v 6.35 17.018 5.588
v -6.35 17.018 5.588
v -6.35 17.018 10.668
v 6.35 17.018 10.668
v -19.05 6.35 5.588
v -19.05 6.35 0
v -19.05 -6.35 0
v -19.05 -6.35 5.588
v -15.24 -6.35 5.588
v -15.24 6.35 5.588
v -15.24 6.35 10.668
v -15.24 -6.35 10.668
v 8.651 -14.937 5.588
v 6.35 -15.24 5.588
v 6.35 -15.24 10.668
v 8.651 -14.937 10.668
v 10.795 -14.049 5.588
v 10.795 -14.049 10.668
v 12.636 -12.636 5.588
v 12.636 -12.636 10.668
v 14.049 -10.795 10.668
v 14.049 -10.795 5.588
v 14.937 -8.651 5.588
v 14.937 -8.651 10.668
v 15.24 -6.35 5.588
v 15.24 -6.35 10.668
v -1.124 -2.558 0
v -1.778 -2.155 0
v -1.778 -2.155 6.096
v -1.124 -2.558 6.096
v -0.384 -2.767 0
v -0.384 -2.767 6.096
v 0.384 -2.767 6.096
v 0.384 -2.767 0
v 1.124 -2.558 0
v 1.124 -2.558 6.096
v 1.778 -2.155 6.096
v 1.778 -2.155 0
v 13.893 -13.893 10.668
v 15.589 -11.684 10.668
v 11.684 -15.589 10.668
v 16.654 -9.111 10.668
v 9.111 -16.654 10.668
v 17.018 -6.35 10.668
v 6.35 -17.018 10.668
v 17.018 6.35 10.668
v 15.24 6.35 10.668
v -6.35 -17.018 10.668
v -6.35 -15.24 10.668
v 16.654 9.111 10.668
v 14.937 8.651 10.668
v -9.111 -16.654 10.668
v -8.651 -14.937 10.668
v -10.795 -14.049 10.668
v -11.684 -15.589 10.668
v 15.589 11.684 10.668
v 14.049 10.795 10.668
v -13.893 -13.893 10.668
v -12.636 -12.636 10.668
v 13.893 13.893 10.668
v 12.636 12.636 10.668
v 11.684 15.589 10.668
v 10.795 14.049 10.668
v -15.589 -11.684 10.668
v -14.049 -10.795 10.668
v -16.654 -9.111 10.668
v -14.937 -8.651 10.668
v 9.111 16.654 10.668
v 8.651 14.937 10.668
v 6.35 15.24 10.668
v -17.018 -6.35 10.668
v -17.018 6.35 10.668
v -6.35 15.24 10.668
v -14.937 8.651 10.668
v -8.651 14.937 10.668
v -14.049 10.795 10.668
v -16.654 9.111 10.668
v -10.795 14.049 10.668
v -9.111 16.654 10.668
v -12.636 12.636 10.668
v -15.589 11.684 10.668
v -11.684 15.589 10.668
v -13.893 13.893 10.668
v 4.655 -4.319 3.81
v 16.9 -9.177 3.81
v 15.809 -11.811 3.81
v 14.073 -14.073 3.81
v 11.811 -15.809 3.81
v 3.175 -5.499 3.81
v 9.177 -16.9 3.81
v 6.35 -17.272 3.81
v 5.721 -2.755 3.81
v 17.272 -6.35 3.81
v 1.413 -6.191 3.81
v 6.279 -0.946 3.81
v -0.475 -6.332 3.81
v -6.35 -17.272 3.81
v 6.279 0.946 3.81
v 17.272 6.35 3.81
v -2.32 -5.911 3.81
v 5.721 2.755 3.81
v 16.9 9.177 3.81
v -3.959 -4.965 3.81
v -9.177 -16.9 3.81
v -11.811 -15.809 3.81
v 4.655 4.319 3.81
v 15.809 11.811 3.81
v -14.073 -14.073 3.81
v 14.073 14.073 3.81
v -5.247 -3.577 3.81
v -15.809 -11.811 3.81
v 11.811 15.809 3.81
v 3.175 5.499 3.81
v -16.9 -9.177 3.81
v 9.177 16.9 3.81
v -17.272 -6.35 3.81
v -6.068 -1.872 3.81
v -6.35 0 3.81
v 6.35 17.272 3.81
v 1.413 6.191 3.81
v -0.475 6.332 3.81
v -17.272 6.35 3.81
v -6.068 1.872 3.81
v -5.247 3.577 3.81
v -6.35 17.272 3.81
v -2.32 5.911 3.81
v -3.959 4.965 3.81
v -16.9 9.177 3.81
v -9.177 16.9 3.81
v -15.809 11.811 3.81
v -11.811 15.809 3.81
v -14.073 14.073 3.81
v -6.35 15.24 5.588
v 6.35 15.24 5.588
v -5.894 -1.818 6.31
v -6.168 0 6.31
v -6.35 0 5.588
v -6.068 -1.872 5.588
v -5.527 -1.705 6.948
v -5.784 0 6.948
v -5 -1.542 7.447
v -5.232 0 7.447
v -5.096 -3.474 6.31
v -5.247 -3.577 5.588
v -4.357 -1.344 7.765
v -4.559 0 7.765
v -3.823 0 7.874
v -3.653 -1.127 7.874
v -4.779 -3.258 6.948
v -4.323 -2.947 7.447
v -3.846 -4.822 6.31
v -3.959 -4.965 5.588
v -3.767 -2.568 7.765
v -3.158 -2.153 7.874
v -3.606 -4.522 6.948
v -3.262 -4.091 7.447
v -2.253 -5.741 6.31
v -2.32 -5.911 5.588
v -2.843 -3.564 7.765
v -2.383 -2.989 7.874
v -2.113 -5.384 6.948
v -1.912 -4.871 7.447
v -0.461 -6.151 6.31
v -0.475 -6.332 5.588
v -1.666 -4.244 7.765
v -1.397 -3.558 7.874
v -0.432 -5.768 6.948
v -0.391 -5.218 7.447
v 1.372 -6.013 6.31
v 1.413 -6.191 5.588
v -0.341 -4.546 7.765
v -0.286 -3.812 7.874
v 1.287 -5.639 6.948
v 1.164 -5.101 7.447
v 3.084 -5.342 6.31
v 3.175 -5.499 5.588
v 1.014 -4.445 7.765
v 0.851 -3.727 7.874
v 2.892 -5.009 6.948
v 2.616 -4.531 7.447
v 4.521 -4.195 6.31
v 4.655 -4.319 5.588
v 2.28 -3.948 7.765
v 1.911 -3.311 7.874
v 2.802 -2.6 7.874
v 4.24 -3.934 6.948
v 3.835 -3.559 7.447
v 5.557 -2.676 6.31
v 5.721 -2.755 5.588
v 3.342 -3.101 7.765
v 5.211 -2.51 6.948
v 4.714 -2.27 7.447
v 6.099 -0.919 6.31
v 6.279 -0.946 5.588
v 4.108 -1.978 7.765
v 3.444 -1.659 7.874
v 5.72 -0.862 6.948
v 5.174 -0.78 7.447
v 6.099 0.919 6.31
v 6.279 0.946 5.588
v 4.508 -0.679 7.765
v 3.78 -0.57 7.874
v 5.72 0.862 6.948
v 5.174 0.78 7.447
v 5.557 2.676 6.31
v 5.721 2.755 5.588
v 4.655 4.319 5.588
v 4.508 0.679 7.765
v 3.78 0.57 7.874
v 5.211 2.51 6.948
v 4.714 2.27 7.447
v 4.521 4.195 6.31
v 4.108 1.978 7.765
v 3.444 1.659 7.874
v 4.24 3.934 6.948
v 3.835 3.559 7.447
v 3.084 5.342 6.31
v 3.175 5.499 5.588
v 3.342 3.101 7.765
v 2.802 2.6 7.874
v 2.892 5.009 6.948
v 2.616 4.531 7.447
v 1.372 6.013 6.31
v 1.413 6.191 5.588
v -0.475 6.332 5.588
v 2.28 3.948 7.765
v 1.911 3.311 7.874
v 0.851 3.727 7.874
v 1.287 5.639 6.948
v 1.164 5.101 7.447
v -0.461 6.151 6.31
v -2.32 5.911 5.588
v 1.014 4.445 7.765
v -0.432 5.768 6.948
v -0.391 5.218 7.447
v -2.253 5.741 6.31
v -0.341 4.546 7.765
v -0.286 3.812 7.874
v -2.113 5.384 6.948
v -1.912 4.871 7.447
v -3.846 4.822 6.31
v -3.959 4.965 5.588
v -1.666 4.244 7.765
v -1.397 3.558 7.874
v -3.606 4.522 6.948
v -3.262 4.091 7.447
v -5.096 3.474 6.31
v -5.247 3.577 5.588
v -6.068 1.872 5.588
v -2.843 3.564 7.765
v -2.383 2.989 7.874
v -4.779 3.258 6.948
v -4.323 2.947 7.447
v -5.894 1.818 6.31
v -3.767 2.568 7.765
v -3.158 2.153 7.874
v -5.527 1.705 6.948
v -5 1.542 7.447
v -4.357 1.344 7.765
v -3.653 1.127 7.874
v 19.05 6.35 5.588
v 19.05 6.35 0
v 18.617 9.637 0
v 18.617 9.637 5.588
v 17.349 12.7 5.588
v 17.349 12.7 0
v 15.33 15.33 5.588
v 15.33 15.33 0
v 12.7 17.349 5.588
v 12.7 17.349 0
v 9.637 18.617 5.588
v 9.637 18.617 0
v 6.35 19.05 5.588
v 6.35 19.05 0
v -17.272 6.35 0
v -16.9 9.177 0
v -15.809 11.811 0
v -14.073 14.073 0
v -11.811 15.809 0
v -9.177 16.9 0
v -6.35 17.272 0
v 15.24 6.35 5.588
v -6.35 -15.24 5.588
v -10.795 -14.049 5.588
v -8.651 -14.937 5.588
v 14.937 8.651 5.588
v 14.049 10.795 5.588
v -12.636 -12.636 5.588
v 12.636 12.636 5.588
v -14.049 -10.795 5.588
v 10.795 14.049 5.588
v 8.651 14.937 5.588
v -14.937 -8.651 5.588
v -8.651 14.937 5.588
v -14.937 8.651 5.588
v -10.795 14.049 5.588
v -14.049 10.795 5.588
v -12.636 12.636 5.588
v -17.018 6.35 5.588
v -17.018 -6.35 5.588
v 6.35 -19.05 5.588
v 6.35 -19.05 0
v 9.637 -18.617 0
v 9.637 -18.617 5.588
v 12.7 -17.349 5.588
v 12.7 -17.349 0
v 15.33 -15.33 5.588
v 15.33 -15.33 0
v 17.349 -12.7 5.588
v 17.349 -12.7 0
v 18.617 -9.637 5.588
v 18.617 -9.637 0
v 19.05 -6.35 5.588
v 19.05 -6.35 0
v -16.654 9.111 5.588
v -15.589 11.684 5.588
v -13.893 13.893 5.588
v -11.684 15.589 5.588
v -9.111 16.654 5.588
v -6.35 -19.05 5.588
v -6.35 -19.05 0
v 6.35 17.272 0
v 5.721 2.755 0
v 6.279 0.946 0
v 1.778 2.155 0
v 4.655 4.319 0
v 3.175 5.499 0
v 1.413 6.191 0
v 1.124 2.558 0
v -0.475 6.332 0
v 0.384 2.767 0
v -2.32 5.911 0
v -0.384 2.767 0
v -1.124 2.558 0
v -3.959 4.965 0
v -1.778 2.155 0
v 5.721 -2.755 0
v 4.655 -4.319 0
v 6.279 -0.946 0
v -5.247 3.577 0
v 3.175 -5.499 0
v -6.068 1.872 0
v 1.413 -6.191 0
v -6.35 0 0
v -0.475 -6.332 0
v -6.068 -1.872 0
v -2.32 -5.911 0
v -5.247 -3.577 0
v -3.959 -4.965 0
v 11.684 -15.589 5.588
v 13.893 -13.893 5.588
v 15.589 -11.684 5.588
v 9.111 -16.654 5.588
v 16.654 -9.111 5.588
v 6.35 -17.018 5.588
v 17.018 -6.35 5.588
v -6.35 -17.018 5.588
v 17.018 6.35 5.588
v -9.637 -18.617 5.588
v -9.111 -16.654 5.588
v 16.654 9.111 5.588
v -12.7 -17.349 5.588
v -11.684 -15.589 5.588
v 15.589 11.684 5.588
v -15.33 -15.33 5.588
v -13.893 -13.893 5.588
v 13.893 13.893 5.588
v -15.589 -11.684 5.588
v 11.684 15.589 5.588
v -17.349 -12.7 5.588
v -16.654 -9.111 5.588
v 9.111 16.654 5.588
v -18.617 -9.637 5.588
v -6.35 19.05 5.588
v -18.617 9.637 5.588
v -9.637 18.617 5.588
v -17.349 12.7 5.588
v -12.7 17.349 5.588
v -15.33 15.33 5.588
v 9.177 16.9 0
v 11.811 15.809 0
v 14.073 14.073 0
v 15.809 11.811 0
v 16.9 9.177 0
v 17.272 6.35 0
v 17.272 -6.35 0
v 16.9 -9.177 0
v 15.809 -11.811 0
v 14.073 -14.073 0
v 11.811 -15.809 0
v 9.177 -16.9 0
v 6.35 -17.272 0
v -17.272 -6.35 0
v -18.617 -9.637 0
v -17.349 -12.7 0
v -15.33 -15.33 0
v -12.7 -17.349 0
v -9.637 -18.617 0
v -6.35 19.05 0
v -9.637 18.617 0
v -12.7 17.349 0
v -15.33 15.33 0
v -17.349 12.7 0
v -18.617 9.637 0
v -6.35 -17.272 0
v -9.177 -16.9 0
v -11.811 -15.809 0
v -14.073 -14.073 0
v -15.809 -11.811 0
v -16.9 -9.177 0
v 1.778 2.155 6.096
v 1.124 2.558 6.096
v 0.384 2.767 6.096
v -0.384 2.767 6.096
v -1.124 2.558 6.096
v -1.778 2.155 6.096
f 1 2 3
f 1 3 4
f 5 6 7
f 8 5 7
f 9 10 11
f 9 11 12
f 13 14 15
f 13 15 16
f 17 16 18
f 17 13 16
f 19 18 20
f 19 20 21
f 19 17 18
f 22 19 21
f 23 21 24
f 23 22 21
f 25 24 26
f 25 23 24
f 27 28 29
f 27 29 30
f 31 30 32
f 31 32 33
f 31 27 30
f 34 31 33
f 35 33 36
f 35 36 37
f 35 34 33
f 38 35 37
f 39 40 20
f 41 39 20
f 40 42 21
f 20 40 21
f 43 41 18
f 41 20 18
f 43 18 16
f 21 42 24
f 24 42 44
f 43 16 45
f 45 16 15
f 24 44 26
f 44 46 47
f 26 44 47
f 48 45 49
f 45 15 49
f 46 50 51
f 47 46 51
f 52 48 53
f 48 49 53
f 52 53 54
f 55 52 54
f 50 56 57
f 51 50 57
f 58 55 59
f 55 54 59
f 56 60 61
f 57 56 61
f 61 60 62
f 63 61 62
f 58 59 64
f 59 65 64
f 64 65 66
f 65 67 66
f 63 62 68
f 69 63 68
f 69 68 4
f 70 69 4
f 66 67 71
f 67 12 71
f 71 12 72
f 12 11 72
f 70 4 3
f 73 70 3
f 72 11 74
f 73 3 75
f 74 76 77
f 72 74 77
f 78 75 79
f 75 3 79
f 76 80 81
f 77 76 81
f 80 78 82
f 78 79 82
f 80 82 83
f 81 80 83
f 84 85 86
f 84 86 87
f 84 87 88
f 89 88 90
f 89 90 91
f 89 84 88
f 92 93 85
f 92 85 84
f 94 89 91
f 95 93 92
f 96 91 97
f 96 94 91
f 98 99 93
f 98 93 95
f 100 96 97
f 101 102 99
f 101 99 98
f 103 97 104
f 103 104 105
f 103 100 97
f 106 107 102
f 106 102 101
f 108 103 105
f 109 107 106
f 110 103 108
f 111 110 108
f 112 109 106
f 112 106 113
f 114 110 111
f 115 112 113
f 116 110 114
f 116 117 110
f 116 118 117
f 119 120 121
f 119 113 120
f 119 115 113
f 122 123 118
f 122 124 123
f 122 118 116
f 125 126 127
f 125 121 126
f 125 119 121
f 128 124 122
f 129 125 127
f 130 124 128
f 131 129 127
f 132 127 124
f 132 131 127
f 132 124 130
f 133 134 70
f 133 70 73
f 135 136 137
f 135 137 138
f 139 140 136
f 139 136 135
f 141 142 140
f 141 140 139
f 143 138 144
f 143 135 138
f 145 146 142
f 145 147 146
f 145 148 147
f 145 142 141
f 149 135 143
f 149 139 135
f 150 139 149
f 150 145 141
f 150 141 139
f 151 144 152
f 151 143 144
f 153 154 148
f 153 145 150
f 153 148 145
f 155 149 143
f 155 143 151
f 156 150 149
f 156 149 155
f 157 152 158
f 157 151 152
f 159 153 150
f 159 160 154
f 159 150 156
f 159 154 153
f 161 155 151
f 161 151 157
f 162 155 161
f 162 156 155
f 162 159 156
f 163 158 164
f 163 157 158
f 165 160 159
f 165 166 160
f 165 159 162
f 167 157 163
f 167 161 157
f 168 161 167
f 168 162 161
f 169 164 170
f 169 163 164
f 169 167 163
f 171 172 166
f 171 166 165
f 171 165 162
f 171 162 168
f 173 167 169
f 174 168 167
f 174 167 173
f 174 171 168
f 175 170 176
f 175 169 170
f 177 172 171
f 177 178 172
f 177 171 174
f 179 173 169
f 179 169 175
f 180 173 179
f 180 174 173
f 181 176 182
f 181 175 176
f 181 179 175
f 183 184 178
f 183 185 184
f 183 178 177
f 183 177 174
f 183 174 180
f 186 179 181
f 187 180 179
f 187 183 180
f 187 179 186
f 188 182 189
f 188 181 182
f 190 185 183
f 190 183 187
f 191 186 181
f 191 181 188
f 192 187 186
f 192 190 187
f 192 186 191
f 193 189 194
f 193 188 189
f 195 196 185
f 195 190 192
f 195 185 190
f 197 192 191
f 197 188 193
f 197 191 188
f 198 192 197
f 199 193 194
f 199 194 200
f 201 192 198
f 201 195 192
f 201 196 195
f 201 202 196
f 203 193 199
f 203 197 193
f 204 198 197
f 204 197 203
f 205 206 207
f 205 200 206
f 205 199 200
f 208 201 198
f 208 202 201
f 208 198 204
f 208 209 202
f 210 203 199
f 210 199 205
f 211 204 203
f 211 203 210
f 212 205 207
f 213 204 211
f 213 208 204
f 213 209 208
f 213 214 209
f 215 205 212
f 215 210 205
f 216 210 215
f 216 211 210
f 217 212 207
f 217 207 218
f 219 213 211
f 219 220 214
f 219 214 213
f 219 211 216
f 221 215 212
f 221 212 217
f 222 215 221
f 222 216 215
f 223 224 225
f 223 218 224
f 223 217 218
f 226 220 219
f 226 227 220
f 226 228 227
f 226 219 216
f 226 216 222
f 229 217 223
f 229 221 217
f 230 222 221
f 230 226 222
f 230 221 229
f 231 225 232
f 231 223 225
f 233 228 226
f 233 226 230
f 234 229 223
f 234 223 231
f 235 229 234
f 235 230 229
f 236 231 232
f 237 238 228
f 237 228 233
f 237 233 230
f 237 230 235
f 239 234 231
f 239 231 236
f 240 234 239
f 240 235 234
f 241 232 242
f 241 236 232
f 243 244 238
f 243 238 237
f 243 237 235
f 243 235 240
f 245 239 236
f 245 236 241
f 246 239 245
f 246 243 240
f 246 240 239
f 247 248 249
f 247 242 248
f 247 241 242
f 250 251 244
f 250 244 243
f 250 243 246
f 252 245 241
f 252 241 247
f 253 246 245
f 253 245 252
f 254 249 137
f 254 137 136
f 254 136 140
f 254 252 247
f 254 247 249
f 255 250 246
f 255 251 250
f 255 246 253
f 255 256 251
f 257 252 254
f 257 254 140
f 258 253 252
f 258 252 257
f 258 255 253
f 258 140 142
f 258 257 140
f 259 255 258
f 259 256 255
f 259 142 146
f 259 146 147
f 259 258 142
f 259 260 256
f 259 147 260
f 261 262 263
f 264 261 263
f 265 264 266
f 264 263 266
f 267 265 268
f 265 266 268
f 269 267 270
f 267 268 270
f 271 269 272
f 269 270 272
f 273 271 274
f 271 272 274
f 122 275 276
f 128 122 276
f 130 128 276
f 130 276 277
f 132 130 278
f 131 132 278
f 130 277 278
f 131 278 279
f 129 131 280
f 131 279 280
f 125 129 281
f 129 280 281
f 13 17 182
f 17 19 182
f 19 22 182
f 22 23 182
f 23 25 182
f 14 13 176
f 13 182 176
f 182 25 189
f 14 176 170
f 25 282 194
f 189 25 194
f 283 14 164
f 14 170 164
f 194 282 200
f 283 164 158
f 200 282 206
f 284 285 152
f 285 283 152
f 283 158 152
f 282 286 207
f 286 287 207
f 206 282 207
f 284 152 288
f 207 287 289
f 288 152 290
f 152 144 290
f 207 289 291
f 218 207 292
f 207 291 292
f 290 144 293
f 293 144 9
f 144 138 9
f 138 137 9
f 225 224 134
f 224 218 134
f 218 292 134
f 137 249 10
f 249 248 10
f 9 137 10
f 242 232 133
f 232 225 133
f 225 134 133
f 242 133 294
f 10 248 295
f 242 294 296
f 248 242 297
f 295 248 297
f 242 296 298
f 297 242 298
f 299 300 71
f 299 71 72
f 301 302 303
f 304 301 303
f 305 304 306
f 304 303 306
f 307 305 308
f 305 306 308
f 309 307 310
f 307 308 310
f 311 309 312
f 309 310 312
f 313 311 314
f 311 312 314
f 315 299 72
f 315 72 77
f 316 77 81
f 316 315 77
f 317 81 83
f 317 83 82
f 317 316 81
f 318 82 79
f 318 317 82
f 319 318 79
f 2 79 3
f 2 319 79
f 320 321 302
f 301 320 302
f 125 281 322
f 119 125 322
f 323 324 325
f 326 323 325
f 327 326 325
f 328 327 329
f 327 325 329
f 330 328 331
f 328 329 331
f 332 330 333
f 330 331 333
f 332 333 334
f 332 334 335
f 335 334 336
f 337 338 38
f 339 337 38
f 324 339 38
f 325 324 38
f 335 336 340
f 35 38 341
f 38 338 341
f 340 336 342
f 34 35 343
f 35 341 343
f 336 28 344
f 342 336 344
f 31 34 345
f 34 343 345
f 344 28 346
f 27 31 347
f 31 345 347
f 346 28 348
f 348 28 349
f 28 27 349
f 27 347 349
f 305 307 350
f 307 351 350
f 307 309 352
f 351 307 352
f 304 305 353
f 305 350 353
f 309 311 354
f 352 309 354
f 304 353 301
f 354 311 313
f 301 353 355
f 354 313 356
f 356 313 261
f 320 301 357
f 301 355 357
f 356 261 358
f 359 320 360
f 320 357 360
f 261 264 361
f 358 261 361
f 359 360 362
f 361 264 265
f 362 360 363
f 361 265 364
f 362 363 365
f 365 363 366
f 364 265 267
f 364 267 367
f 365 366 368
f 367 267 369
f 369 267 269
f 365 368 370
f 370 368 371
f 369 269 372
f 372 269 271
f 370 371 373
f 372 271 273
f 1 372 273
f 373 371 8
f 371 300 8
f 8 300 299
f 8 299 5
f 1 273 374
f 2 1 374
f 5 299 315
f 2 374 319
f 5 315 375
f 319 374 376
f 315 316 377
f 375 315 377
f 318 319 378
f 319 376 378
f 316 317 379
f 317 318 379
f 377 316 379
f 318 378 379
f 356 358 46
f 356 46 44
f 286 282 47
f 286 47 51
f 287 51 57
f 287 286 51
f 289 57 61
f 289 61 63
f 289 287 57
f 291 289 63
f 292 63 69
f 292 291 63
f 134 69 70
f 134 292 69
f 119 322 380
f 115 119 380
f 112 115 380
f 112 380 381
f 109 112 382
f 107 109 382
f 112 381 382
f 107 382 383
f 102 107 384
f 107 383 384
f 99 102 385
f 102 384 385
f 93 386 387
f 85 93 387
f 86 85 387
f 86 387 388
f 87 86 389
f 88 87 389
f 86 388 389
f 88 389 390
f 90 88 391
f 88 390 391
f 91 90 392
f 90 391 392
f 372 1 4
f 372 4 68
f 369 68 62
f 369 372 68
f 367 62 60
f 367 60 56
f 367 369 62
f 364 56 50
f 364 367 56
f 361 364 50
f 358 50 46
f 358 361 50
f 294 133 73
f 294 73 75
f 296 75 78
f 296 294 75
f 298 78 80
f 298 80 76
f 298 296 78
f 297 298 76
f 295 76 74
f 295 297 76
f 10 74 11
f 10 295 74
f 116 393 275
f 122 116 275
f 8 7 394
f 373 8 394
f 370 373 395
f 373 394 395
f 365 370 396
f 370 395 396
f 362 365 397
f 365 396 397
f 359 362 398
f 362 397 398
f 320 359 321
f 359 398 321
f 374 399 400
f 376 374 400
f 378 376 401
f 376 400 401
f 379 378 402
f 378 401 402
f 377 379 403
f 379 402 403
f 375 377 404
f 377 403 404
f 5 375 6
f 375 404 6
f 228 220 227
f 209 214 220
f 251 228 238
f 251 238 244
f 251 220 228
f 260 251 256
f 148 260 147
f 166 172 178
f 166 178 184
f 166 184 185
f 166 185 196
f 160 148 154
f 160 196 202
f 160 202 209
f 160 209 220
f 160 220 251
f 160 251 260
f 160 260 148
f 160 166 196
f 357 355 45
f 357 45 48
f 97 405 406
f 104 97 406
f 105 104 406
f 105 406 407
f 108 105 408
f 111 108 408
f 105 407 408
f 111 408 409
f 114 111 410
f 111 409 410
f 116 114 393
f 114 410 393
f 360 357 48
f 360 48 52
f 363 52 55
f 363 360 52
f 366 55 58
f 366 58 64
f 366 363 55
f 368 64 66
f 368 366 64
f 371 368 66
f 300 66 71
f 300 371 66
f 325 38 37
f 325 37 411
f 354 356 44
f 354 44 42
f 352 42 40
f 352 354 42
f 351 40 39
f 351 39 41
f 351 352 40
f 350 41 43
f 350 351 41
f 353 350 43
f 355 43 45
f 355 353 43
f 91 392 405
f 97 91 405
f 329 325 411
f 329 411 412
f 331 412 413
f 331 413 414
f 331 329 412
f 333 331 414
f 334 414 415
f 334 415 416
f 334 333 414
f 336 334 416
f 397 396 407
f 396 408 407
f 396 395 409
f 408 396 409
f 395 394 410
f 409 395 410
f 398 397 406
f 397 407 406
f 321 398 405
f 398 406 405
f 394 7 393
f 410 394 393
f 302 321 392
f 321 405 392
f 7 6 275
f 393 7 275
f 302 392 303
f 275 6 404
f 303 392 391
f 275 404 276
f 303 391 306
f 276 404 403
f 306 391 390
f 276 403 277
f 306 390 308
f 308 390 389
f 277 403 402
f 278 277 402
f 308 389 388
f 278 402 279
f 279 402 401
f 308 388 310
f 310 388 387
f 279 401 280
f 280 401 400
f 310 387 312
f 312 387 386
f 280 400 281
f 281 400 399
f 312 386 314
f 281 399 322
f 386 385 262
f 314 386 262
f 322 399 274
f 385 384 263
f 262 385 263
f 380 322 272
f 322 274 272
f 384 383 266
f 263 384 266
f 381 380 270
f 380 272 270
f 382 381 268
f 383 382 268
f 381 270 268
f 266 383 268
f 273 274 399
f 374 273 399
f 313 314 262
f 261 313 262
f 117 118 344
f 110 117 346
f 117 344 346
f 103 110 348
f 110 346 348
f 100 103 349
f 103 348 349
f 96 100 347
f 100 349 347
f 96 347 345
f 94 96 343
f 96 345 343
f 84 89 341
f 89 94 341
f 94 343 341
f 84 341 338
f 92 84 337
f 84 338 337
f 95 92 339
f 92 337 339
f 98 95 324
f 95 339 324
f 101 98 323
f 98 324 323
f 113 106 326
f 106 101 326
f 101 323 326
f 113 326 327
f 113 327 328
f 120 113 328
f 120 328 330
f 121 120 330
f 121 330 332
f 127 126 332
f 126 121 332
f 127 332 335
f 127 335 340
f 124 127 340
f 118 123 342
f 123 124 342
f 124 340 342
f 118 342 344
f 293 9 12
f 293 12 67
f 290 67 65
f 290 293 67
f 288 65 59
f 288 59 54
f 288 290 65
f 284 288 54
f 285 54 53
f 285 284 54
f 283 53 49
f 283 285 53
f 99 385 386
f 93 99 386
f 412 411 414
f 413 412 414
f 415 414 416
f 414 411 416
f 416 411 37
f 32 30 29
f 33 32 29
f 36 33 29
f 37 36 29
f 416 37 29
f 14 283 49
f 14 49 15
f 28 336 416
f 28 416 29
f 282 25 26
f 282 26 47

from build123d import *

# Parameters (mm, degrees)
SKETCH1_R           = 6.35
BOSS_EXTRUDE1_DEPTH = 6.096
BOSS_EXTRUDE2_DEPTH = 1.778
CUT_EXTRUDE1_START  = -1.778
CUT_EXTRUDE1_DEPTH  = 1.778
SKETCH5_R           = 6.35
BOSS_EXTRUDE3_DEPTH = 1.778
FILLET2_R           = 2.54
BOSS_EXTRUDE5_START = 3.81
BOSS_EXTRUDE5_DEPTH = 3.81
BOSS_EXTRUDE6_DEPTH = 5.08


with BuildPart() as part:
    # Sketch1 → Boss-Extrude1 (new body)
    with BuildSketch(Plane.XY):
        with Locations(Location((0, 0, 0), (0, 0, 180))):
            Circle(SKETCH1_R)
        with BuildLine():
            Line((-1.778, 2.155261469), (-1.778, -2.155261469))
            ThreePointArc((-1.778, -2.155261469), (0, -2.794), (1.778, -2.155261469))
            Line((1.778, -2.155261469), (1.778, 2.155261469))
            ThreePointArc((1.778, 2.155261469), (0, 2.794), (-1.778, 2.155261469))
        make_face(mode=Mode.SUBTRACT)
    extrude(amount=BOSS_EXTRUDE1_DEPTH)

    # Sketch3 → Boss-Extrude2 (add)
    with BuildSketch(Plane.XY.offset(3.81)):
        with BuildLine():
            Line((-6.35, 19.05), (6.35, 19.05))
            ThreePointArc((6.35, 19.05), (15.330256121, 15.330256121), (19.05, 6.35))
            Line((19.05, 6.35), (19.05, -6.35))
            ThreePointArc((19.05, -6.35), (15.330256121, -15.330256121), (6.35, -19.05))
            Line((6.35, -19.05), (-6.35, -19.05))
            ThreePointArc((-6.35, -19.05), (-15.330256121, -15.330256121), (-19.05, -6.35))
            Line((-19.05, -6.35), (-19.05, 6.35))
            ThreePointArc((-19.05, 6.35), (-15.330256121, 15.330256121), (-6.35, 19.05))
        make_face()
    extrude(amount=BOSS_EXTRUDE2_DEPTH)

    # Sketch4 → Cut-Extrude1 (cut)
    with BuildSketch(Plane.XY.offset(5.588).offset(CUT_EXTRUDE1_START)):
        with BuildLine():
            Line((-1.778, 2.155261469), (-1.778, -2.155261469))
            ThreePointArc((-1.778, -2.155261469), (0, -2.794), (1.778, -2.155261469))
            Line((1.778, -2.155261469), (1.778, 2.155261469))
            ThreePointArc((1.778, 2.155261469), (0, 2.794), (-1.778, 2.155261469))
        make_face()
    extrude(amount=CUT_EXTRUDE1_DEPTH, mode=Mode.SUBTRACT)

    # Sketch5 → Boss-Extrude3 (add)
    with BuildSketch(Plane.XY.offset(6.096)):
        with Locations(Location((0, 0, 0), (0, 0, 180))):
            Circle(SKETCH5_R)
    extrude(amount=BOSS_EXTRUDE3_DEPTH)

    # Fillet2
    # the kernel refuses this fillet: 2.54 mm, written as the material it takes off along each edge
    with BuildSketch(Plane(origin=(0, 0, 7.874), x_dir=(-1, 0, 0), z_dir=(0, 1, 0))) as fillet2_piece_1:
        with BuildLine():
            CenterArc((3.82273191, -2.54), FILLET2_R, 5.739170477, 84.260829523)
            Line((3.82273191, 0), (3.82273191, 0.0508))
            Line((3.82273191, 0.0508), (6.35, 0.0508))
            Line((6.35, 0.0508), (6.4008, 0))
            ThreePointArc((6.4008, 0), (6.4008, -1.143), (6.400545362, -2.28092))
            Line((6.400545362, -2.28092), (6.35, -2.286))
        make_face()
    revolve(axis=Axis((0, 0, 7.874), (0, 0, 1)), mode=Mode.SUBTRACT)

    # Sketch6 → Boss-Extrude5 (add)
    with BuildSketch(Plane(origin=(0, 0, 3.81), x_dir=(-1, 0, 0), z_dir=(0, 0, -1)).offset(BOSS_EXTRUDE5_START)):
        with BuildLine():
            Line((-6.35, 19.05), (6.35, 19.05))
            ThreePointArc((6.35, 19.05), (15.330256121, 15.330256121), (19.05, 6.35))
            Line((19.05, 6.35), (19.05, -6.35))
            ThreePointArc((19.05, -6.35), (15.330256121, -15.330256121), (6.35, -19.05))
            Line((6.35, -19.05), (-6.35, -19.05))
            ThreePointArc((-6.35, -19.05), (-15.330256121, -15.330256121), (-19.05, -6.35))
            Line((-19.05, -6.35), (-19.05, 6.35))
            ThreePointArc((-19.05, 6.35), (-15.330256121, 15.330256121), (-6.35, 19.05))
        make_face()
        with BuildLine():
            Line((-17.272, 6.35), (-17.272, -6.35))
            ThreePointArc((-17.272, -6.35), (-14.073020264, -14.073020264), (-6.35, -17.272))
            Line((-6.35, -17.272), (6.35, -17.272))
            ThreePointArc((6.35, -17.272), (14.073020264, -14.073020264), (17.272, -6.35))
            Line((17.272, -6.35), (17.272, 6.35))
            ThreePointArc((17.272, 6.35), (14.073020264, 14.073020264), (6.35, 17.272))
            Line((6.35, 17.272), (-6.35, 17.272))
            ThreePointArc((-6.35, 17.272), (-14.073020264, 14.073020264), (-17.272, 6.35))
        make_face(mode=Mode.SUBTRACT)
    extrude(amount=-BOSS_EXTRUDE5_DEPTH)

    # Sketch7 → Boss-Extrude6 (add)
    with BuildSketch(Plane.XY.offset(5.588)):
        with BuildLine():
            Line((-6.35, 17.018), (6.35, 17.018))
            ThreePointArc((6.35, 17.018), (13.893415142, 13.893415142), (17.018, 6.35))
            Line((17.018, 6.35), (17.018, -6.35))
            ThreePointArc((17.018, -6.35), (13.893415142, -13.893415142), (6.35, -17.018))
            Line((6.35, -17.018), (-6.35, -17.018))
            ThreePointArc((-6.35, -17.018), (-13.893415142, -13.893415142), (-17.018, -6.35))
            Line((-17.018, -6.35), (-17.018, 6.35))
            ThreePointArc((-17.018, 6.35), (-13.893415142, 13.893415142), (-6.35, 17.018))
        make_face()
        with BuildLine():
            ThreePointArc((-6.35, 15.24), (-12.636179285, 12.636179285), (-15.24, 6.35))
            Line((-15.24, 6.35), (-15.24, -6.35))
            ThreePointArc((-15.24, -6.35), (-12.636179285, -12.636179285), (-6.35, -15.24))
            Line((-6.35, -15.24), (6.35, -15.24))
            ThreePointArc((6.35, -15.24), (12.636179285, -12.636179285), (15.24, -6.35))
            Line((15.24, -6.35), (15.24, 6.35))
            ThreePointArc((15.24, 6.35), (12.636179285, 12.636179285), (6.35, 15.24))
            Line((6.35, 15.24), (-6.35, 15.24))
        make_face(mode=Mode.SUBTRACT)
    extrude(amount=BOSS_EXTRUDE6_DEPTH)


solid = part.part
